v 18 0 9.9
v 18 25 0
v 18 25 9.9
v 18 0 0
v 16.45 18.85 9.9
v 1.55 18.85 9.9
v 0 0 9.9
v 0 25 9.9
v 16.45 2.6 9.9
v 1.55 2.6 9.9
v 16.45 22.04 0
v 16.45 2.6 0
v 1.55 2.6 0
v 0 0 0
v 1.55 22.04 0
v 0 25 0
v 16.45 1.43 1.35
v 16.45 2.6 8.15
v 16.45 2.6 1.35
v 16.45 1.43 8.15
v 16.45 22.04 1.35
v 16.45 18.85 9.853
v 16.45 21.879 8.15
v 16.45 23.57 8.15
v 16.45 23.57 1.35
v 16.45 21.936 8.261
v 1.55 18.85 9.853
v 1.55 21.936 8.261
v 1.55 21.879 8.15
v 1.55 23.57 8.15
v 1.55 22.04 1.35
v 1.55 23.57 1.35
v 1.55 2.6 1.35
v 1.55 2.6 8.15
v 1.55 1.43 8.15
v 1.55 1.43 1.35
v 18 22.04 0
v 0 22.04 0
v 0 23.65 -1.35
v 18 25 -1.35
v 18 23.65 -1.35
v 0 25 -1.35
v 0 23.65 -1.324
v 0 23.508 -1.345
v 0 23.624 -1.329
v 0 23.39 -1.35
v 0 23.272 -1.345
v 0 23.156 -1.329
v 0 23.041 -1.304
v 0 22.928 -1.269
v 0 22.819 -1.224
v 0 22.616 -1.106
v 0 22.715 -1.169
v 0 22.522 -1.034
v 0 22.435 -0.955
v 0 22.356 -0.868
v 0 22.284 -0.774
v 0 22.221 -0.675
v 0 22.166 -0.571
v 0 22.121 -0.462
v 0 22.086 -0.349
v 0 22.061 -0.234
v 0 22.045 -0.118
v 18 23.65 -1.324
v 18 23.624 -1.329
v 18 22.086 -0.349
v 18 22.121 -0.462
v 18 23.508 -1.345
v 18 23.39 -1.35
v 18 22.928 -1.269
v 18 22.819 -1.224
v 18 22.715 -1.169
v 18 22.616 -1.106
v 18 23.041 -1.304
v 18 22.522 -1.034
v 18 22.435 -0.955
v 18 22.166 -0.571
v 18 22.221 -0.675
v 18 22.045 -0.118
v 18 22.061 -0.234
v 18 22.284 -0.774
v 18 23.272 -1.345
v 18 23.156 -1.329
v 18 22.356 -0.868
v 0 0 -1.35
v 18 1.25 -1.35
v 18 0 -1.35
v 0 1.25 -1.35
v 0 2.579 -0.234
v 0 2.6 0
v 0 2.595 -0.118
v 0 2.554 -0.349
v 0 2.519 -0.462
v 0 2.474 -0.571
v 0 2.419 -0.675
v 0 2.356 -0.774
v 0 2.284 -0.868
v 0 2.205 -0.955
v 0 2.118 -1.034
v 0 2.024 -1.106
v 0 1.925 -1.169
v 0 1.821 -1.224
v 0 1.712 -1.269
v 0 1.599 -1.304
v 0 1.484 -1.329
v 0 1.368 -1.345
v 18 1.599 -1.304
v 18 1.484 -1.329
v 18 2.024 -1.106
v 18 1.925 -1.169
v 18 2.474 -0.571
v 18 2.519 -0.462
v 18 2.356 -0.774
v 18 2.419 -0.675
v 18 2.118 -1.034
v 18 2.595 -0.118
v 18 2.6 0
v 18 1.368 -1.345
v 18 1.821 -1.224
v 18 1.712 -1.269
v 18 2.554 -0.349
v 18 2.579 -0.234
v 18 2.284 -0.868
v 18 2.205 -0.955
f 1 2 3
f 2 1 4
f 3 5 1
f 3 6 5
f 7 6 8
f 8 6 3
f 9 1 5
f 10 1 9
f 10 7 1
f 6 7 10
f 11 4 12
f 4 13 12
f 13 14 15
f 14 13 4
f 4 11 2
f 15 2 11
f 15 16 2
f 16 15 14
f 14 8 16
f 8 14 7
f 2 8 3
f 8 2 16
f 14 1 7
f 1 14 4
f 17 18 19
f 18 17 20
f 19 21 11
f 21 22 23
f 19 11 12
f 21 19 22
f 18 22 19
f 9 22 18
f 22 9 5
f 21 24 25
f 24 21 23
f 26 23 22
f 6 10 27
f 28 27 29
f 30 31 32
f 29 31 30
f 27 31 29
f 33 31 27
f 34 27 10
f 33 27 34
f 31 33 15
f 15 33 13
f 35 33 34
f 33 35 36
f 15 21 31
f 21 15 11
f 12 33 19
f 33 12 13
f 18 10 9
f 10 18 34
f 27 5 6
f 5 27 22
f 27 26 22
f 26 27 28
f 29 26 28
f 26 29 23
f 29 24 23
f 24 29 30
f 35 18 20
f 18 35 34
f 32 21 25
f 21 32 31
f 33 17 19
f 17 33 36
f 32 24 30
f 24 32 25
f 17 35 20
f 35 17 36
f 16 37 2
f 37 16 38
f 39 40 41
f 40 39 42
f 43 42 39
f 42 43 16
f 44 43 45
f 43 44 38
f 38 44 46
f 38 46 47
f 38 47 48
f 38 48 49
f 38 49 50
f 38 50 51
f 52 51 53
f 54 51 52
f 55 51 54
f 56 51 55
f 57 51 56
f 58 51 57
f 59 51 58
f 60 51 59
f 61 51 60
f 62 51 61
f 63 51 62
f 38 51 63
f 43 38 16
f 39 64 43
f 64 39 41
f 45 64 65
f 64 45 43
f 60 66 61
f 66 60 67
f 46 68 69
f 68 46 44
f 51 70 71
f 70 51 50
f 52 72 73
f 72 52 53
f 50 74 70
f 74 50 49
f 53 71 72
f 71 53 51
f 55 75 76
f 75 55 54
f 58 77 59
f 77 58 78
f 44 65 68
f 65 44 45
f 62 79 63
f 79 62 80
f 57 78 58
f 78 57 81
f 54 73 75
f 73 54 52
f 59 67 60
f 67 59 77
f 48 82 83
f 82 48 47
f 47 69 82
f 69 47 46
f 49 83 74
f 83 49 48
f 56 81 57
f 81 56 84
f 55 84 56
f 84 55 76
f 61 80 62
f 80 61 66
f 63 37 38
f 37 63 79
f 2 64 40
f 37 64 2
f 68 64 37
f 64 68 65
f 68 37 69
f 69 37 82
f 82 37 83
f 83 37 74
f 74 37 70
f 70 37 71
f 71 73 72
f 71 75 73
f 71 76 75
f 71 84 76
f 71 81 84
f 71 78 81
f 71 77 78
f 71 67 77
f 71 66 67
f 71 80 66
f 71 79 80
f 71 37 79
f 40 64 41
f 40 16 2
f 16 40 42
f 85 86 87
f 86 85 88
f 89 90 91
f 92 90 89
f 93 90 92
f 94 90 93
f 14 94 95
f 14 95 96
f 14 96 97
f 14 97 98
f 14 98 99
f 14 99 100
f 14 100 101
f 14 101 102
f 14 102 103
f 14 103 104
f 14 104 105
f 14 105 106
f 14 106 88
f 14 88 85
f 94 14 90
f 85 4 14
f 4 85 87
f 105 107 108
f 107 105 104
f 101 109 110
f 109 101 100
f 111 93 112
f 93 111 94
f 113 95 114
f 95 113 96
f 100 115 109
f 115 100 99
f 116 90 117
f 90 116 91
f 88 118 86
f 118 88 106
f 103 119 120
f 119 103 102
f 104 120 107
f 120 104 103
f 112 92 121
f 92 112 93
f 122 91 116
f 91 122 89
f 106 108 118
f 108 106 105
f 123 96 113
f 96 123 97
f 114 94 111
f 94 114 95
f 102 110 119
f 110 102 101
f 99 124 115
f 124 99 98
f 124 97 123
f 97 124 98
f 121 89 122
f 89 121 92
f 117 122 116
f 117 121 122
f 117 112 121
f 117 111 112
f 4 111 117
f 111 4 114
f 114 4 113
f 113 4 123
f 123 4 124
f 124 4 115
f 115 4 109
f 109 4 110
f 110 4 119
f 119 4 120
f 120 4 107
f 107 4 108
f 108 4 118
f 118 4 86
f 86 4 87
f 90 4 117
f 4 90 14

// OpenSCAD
$fa = 5;
$fs = 0.01;

/*
 * The RJ45 keystone receiver
 */
module rj45Receiver() {
	difference() {
		cube([18, 25, 9.9]);
		translate([1.55, 2.6, 0]) {
			cube([14.9, 19.44, 7.9]);
		}
		translate([1.55, 2.6, 7.9]) {
			cube([14.9, 16.25, 2]);
		}
		translate([1.55, 17.45, 7.2]) {
			rotate(v=[1, 0, 0], a=-27.3) {
				cube([14.9, 3.5, 3]);
			}
		}
		translate([1.55, 1.43, 1.35]) {
			cube([14.9, 22.14, 6.8]);
		}
	}
	translate([0, 22.04, -1.35]) {
		intersection() {
			cube([18, 2.96, 1.35]);
			union() {
				translate([0, 1.61, 0]) {
					cube([20.42, 1.61, 1.35]);
				}
				translate([0, 1.35, 1.35]) {
					rotate(v=[0, 1, 0], a=90) {
						cylinder(h=20.42, r=1.35);
					}
				}
			}
		}
	}

	translate([0, 0, -1.35]) {
		intersection() {
			cube([18, 2.6, 1.35]);
			union() {
				cube([20.42, 1.25, 1.35]);
				translate([0, 1.25, 1.35]) {
					rotate(v=[0, 1, 0], a=90) {
						cylinder(h=20.42, r=1.35);
					}
				}
			}
		}
	}
}

/*
 * So a hole can be cut for the keystone socket
 */
module rj45VolumeBlock() {
	cube([18, 25, 9.9]);
}

rj45Receiver();
